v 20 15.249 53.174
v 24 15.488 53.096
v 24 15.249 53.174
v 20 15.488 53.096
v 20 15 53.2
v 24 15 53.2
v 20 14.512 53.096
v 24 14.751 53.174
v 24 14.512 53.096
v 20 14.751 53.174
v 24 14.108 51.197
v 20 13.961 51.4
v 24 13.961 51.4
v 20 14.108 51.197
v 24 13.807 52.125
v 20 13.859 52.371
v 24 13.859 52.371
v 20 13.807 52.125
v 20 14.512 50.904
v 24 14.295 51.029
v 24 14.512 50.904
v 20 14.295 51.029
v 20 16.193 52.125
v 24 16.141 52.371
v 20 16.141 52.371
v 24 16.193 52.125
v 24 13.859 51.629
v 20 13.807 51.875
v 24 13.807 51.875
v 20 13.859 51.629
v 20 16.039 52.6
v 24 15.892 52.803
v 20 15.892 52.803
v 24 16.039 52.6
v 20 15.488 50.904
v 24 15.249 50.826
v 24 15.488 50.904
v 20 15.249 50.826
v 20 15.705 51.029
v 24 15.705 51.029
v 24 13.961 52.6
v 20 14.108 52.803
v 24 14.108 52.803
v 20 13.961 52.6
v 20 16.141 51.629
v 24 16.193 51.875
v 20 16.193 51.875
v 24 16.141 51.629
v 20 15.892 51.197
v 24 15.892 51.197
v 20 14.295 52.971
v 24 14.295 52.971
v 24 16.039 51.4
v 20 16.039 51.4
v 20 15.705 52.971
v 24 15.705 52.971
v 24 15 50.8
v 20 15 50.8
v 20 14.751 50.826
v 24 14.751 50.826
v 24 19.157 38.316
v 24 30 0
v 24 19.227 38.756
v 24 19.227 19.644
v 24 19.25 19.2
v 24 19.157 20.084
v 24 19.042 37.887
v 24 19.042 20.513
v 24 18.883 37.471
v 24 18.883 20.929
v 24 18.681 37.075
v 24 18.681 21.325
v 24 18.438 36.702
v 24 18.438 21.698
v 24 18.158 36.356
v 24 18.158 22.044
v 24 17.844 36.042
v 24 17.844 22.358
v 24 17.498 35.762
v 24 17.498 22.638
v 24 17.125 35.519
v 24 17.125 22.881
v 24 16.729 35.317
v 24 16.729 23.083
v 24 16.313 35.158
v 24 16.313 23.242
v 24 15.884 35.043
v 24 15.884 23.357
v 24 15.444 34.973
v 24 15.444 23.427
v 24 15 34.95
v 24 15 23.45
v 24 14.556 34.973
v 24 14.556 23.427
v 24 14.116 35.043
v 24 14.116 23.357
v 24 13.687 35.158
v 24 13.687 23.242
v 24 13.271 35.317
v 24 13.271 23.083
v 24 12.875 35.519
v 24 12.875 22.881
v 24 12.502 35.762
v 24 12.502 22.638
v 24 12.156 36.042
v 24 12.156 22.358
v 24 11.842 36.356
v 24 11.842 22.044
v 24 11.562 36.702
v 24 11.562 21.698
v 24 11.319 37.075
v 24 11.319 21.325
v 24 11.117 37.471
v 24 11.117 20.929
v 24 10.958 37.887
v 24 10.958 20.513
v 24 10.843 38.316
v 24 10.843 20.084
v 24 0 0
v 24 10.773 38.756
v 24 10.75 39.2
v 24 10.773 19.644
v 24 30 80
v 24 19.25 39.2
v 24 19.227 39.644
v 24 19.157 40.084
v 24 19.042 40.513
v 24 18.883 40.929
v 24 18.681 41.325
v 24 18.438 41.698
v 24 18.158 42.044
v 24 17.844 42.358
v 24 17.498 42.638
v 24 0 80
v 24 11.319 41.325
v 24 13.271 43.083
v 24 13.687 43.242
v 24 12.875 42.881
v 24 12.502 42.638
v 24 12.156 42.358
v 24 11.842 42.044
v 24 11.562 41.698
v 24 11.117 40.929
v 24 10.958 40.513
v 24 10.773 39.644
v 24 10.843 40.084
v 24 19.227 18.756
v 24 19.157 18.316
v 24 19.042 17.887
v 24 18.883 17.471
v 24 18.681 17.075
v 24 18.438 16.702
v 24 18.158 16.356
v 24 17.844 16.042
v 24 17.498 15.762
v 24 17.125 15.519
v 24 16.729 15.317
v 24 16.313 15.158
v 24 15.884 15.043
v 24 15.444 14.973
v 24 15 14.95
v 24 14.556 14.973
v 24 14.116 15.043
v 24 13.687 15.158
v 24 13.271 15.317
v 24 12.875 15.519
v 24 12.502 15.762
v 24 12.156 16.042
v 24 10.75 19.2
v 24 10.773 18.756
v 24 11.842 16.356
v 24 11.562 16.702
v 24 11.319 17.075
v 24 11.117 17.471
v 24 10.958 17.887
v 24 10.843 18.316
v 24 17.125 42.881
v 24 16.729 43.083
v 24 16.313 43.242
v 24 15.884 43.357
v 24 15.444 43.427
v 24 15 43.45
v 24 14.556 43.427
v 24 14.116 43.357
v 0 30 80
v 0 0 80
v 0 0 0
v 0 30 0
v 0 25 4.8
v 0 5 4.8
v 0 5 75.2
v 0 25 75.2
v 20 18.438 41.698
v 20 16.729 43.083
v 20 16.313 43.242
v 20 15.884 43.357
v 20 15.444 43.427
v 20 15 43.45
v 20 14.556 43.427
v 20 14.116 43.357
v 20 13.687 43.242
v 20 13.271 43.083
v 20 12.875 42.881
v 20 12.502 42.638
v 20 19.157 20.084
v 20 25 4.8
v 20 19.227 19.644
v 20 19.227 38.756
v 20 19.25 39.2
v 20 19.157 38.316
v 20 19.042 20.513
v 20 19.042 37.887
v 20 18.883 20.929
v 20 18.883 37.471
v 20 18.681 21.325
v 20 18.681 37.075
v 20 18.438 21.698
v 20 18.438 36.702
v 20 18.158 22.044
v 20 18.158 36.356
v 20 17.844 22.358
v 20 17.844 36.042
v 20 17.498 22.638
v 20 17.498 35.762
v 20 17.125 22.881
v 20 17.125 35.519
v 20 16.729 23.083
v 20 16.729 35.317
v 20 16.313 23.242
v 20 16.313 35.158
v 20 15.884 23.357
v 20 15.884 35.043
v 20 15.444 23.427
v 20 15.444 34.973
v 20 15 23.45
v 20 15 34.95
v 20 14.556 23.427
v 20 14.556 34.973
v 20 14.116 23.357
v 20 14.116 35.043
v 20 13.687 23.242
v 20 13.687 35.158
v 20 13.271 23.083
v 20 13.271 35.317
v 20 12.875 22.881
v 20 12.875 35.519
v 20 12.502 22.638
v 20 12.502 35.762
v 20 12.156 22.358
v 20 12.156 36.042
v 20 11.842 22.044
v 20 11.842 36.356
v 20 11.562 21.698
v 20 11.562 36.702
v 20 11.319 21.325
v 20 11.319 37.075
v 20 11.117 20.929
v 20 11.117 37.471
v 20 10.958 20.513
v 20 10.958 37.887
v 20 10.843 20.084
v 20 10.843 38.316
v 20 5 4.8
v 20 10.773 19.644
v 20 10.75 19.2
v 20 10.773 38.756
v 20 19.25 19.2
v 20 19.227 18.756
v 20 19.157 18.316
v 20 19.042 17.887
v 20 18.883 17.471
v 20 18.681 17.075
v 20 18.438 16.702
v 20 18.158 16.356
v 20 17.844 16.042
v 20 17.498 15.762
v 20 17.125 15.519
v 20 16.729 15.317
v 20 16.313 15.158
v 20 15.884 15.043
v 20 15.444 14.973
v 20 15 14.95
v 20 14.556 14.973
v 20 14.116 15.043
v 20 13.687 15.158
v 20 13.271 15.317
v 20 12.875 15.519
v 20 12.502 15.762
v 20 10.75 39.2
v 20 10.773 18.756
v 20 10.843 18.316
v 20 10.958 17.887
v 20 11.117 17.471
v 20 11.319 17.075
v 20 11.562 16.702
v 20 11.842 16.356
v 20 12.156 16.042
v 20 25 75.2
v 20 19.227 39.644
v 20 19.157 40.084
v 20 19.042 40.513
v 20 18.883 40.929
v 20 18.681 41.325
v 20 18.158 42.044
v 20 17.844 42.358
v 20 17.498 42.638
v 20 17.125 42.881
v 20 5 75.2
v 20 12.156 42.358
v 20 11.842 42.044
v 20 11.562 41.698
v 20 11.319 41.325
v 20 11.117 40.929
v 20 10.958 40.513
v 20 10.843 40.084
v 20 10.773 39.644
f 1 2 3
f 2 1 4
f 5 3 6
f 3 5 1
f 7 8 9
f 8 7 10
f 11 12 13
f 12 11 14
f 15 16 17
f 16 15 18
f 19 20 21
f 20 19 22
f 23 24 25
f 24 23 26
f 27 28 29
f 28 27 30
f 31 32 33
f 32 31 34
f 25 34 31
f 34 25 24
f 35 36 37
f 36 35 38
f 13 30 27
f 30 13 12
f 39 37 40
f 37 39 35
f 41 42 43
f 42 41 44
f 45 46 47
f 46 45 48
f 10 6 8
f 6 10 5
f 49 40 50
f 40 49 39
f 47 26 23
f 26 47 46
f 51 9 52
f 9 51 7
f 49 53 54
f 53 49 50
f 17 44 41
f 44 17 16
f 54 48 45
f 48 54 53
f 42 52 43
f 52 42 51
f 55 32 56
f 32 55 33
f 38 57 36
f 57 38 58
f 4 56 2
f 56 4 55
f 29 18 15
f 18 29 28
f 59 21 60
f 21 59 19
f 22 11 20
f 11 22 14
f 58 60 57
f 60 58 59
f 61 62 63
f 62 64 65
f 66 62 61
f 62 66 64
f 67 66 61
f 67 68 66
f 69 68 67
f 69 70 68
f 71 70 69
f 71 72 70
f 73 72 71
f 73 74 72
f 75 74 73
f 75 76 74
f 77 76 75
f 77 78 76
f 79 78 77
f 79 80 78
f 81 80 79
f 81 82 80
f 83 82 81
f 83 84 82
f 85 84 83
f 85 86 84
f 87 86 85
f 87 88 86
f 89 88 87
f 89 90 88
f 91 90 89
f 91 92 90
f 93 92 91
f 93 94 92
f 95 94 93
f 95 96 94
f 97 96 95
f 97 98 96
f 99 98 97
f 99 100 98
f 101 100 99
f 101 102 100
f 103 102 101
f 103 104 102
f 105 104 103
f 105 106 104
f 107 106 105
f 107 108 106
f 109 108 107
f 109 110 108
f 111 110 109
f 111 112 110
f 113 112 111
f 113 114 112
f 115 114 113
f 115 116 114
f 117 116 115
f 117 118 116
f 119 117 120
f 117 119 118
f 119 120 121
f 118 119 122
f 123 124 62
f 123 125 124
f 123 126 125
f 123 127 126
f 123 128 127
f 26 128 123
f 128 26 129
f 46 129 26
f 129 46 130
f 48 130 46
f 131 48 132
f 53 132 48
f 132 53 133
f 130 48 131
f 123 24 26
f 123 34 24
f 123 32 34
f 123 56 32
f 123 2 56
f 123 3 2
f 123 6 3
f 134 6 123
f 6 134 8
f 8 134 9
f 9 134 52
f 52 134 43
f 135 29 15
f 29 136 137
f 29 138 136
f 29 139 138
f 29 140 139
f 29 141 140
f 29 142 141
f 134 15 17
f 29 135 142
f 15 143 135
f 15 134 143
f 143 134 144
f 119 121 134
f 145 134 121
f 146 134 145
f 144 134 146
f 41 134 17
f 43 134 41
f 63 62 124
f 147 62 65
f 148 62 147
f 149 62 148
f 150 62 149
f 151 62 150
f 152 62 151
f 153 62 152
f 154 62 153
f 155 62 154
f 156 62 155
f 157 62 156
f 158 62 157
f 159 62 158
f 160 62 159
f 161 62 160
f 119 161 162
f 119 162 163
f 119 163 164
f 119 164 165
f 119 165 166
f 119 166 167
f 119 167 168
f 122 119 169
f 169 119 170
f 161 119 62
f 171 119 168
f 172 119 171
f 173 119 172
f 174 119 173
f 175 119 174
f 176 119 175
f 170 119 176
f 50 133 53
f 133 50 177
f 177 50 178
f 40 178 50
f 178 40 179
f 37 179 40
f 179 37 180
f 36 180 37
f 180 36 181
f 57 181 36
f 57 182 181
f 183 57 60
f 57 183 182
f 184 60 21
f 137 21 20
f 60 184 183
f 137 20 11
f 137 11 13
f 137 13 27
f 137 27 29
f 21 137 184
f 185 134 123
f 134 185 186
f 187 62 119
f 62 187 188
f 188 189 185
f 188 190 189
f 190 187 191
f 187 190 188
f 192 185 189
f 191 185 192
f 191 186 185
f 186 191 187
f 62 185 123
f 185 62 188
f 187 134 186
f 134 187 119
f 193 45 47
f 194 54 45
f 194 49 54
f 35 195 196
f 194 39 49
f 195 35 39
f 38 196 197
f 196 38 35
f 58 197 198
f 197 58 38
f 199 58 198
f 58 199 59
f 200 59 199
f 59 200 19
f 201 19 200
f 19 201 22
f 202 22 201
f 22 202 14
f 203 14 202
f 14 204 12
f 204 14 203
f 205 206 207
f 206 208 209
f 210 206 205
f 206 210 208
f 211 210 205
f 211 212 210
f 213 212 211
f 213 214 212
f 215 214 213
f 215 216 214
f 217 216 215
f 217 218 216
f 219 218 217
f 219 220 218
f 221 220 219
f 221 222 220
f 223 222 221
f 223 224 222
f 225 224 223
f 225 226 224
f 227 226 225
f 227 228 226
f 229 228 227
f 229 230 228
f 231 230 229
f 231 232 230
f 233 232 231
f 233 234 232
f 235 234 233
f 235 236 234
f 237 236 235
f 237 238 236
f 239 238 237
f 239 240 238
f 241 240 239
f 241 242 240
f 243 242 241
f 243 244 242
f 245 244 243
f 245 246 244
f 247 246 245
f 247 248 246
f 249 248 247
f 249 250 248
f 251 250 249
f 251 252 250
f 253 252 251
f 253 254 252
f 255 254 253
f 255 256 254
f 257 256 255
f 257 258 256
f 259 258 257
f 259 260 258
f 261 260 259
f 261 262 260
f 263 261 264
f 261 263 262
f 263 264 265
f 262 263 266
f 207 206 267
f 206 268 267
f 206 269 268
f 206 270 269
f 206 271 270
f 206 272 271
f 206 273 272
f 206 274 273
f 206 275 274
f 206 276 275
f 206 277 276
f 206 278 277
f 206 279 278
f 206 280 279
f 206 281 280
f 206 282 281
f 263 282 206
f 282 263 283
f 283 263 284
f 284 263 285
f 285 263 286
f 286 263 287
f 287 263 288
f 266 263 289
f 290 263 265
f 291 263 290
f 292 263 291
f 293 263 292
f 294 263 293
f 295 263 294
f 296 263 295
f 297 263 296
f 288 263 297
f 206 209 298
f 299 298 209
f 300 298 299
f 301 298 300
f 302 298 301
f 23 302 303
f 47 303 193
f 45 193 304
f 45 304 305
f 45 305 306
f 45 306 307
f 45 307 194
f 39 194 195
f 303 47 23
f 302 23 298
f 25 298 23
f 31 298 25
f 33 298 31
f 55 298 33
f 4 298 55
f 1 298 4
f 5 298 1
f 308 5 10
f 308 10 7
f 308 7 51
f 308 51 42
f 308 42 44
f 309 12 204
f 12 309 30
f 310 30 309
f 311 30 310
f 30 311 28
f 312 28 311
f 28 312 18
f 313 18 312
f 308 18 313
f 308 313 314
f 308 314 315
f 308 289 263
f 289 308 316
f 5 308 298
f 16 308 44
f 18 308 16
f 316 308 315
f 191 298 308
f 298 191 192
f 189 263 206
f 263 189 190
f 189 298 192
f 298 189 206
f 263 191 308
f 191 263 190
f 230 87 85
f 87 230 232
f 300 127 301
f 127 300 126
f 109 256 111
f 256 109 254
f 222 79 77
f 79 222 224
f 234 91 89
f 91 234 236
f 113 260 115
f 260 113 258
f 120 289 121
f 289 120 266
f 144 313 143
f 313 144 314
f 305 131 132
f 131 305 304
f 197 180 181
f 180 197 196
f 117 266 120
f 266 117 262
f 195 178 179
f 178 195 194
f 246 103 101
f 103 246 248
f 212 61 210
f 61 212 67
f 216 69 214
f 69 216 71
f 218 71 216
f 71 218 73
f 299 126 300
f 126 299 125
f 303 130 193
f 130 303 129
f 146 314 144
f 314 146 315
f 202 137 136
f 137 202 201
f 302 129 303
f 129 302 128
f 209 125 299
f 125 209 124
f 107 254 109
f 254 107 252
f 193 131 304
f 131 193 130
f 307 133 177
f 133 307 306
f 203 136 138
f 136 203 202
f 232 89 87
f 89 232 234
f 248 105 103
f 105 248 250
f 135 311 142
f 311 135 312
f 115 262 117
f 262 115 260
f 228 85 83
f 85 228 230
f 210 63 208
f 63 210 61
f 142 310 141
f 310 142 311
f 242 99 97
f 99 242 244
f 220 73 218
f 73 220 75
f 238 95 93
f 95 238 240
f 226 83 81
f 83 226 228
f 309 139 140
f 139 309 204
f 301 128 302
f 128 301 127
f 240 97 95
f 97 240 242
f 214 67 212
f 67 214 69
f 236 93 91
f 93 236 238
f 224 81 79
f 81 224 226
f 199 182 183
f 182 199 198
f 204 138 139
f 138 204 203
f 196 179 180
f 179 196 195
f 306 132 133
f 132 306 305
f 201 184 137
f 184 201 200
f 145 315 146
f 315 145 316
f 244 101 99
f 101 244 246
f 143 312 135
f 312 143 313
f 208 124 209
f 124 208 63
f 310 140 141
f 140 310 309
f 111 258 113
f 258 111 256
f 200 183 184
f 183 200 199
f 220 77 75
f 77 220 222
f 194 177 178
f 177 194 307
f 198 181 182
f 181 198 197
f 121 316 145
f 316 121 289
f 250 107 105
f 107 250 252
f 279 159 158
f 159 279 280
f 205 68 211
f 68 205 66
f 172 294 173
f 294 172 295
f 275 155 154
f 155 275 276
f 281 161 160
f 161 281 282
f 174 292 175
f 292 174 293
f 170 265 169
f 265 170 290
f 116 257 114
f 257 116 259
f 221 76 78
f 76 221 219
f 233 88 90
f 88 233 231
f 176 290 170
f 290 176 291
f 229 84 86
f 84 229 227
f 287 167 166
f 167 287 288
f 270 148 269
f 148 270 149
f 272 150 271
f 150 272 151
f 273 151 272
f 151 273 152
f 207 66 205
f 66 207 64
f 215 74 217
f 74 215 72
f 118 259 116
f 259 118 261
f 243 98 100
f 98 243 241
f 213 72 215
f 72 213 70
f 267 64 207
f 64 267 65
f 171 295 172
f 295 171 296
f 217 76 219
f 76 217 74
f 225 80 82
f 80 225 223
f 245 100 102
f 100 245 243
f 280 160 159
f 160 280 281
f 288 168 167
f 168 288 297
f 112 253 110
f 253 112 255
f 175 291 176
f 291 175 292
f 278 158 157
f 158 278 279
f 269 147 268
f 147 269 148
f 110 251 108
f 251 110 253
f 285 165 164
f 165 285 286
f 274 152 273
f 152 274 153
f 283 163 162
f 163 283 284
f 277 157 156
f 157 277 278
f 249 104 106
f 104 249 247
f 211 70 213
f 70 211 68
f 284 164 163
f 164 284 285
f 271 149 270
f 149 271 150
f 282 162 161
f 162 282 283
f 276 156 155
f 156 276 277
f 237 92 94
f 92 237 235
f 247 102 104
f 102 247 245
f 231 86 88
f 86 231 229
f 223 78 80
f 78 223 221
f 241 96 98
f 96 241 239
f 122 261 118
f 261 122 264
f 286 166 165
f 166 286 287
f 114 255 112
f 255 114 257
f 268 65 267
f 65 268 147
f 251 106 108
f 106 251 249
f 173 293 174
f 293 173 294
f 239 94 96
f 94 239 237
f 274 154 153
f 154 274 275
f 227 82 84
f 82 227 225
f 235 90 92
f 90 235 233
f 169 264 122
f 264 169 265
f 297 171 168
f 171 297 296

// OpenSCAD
// file: ../Parts/Vruty.scad
$fn = 30;

module otvorVrut(dlzka, priemer, hlavaPriemer, hlavaVyska) {
    union() {
        cylinder(h = dlzka, d = priemer);
        cylinder(h = hlavaVyska, d1 = hlavaPriemer, d2 = priemer);
    }
}

module otvorVrut4mm(dlzka = 20) {
    otvorVrut(dlzka, priemer = 3.4, hlavaPriemer = 8.5, hlavaVyska = 3.2);
}

module otvorVrut3_5mm(dlzka = 20) {
    otvorVrut(dlzka, priemer = 2.9, hlavaPriemer = 7.5, hlavaVyska = 3);
}

module otvorVrut3mm(dlzka = 20) {
    otvorVrut(dlzka, priemer = 2.4, hlavaPriemer = 6.4, hlavaVyska = 2.2);
}

module testBlok() {
    difference() {
        translate([-8,-6,0]) cube([40,21,7]);

        translate([0,13,0]) union() {
            otvorVrut4mm();
            translate([12, 0, 0]) otvorVrut3_5mm();
            translate([24, 0, 0]) otvorVrut3mm();

        }

        union() {
            otvorVrut4mm();
            translate([12, 0, 0]) otvorVrut3_5mm();
            translate([24, 0, 0]) otvorVrut3mm();
        }
    }
}

testBlok();
// main file
use <../Parts/Vruty.scad>

// 70 - výška predná doska
// 69 - výška bočné dosky

// zarazka 52mm na docentrovenie bokov
module zarazka_boky() {
    difference() {
        cube([35, 30, 57]);
        cube([30, 30, 52]);
        translate([15,15,57])
            rotate([180,0,0]) otvorVrut3mm();
        translate([35,15,25])
            rotate([0,-90,0]) otvorVrut3mm();
    }
}

module forma_front_nohy() {
    offset = 52;
    otvor1 = offset+21+15;
    otvor2 = offset+21+35;
    vyska_inner = offset + 70;
    vyska_outer = vyska_inner + 5;

    difference() {
        cube([35, 20, vyska_outer]);
        cube([30, 20, vyska_inner]);
        translate([15,10,vyska_outer])
            rotate([180,0,0]) otvorVrut3mm();
        translate([36,10,vyska_inner-20])
            rotate([0,-90,0]) otvorVrut3mm();
        translate([36,10,60])
            rotate([0,-90,0]) otvorVrut3mm();
        translate([36,10,4])
            rotate([0,-90,0]) otvorVrut3mm();

        translate([25,10,vyska_inner-otvor1]) rotate([0,90,0]) cylinder(h = 20, d = 8.5);
        translate([25,10,vyska_inner-otvor2]) rotate([0,90,0]) cylinder(h = 20, d = 8.5);
    }
}


module forma_front_doska() {
    korekciaVyska = 0.2;
    korekciaSirka = 0;
    vyska=70+2*korekciaVyska;
    sirka = 20 + 2*korekciaSirka;
    o1 = 21+15;
    o2 = 21+35;

    difference() {
        cube([24, 30, 80]);
        translate([0,5-korekciaSirka,5-korekciaVyska]) cube([20, sirka, vyska]);

        translate([31,15,52])
            rotate([0,-90,0]) otvorVrut3mm();

        translate([10,15,vyska-o1-korekciaVyska+5])
            rotate([0,90,0]) cylinder(h = 20, d = 8.5);
        translate([10,15,vyska-o2-korekciaVyska+5]) rotate([0,90,0]) cylinder(h = 20, d = 8.5);
    }
}

module dowel() {
    union() {
        translate([0,0,0.4]) cylinder(h = 8, d = 8);
        cylinder(h = 8, d = 7.6);

    }

}

$fn=60;

//zarazka_boky();
//forma_front_nohy();
forma_front_doska();
//dowel();
